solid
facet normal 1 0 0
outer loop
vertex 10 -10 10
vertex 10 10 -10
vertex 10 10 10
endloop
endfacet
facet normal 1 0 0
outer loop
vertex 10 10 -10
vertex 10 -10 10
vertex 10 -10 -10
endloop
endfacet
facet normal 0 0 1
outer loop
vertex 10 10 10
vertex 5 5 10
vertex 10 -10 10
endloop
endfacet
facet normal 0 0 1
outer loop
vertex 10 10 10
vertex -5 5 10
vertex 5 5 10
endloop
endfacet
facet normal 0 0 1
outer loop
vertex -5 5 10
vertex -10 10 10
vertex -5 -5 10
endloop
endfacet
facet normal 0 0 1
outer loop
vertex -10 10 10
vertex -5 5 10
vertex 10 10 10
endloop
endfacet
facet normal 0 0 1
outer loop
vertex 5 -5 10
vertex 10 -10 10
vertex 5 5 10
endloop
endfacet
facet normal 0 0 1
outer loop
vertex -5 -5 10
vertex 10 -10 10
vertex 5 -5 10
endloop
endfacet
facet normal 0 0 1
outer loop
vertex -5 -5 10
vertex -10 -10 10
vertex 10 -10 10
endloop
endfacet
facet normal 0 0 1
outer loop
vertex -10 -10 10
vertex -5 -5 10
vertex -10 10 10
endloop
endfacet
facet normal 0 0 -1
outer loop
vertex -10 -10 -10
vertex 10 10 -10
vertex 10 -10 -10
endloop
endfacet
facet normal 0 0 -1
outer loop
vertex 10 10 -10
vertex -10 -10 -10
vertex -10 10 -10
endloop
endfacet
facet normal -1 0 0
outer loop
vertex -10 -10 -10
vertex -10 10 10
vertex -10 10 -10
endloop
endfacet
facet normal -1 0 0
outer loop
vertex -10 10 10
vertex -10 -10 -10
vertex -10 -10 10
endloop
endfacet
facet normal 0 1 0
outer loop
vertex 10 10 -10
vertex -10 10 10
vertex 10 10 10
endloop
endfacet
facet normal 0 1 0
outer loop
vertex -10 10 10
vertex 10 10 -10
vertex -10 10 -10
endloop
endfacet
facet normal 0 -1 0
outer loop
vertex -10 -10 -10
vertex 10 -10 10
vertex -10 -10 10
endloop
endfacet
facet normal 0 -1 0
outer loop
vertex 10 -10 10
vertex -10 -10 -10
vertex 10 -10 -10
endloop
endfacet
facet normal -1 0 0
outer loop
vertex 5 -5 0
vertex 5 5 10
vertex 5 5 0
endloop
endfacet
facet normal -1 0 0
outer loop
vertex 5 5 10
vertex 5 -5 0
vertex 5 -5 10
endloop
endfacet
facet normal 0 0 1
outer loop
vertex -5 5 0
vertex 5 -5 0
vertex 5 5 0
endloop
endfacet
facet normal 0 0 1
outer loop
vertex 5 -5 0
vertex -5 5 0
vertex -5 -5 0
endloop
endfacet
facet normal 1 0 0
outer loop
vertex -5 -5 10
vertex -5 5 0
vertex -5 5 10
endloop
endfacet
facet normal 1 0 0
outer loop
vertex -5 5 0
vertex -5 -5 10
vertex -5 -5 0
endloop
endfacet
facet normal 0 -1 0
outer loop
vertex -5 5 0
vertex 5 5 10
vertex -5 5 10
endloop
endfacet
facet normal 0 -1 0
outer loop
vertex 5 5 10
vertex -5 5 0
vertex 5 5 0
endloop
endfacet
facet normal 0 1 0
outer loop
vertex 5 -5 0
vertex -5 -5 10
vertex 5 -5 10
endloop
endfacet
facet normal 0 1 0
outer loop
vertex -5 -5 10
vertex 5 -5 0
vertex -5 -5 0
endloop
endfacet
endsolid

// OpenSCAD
difference(){cube(20,center=true);translate([0,0,5])cube([10,10,10],center=true);}
